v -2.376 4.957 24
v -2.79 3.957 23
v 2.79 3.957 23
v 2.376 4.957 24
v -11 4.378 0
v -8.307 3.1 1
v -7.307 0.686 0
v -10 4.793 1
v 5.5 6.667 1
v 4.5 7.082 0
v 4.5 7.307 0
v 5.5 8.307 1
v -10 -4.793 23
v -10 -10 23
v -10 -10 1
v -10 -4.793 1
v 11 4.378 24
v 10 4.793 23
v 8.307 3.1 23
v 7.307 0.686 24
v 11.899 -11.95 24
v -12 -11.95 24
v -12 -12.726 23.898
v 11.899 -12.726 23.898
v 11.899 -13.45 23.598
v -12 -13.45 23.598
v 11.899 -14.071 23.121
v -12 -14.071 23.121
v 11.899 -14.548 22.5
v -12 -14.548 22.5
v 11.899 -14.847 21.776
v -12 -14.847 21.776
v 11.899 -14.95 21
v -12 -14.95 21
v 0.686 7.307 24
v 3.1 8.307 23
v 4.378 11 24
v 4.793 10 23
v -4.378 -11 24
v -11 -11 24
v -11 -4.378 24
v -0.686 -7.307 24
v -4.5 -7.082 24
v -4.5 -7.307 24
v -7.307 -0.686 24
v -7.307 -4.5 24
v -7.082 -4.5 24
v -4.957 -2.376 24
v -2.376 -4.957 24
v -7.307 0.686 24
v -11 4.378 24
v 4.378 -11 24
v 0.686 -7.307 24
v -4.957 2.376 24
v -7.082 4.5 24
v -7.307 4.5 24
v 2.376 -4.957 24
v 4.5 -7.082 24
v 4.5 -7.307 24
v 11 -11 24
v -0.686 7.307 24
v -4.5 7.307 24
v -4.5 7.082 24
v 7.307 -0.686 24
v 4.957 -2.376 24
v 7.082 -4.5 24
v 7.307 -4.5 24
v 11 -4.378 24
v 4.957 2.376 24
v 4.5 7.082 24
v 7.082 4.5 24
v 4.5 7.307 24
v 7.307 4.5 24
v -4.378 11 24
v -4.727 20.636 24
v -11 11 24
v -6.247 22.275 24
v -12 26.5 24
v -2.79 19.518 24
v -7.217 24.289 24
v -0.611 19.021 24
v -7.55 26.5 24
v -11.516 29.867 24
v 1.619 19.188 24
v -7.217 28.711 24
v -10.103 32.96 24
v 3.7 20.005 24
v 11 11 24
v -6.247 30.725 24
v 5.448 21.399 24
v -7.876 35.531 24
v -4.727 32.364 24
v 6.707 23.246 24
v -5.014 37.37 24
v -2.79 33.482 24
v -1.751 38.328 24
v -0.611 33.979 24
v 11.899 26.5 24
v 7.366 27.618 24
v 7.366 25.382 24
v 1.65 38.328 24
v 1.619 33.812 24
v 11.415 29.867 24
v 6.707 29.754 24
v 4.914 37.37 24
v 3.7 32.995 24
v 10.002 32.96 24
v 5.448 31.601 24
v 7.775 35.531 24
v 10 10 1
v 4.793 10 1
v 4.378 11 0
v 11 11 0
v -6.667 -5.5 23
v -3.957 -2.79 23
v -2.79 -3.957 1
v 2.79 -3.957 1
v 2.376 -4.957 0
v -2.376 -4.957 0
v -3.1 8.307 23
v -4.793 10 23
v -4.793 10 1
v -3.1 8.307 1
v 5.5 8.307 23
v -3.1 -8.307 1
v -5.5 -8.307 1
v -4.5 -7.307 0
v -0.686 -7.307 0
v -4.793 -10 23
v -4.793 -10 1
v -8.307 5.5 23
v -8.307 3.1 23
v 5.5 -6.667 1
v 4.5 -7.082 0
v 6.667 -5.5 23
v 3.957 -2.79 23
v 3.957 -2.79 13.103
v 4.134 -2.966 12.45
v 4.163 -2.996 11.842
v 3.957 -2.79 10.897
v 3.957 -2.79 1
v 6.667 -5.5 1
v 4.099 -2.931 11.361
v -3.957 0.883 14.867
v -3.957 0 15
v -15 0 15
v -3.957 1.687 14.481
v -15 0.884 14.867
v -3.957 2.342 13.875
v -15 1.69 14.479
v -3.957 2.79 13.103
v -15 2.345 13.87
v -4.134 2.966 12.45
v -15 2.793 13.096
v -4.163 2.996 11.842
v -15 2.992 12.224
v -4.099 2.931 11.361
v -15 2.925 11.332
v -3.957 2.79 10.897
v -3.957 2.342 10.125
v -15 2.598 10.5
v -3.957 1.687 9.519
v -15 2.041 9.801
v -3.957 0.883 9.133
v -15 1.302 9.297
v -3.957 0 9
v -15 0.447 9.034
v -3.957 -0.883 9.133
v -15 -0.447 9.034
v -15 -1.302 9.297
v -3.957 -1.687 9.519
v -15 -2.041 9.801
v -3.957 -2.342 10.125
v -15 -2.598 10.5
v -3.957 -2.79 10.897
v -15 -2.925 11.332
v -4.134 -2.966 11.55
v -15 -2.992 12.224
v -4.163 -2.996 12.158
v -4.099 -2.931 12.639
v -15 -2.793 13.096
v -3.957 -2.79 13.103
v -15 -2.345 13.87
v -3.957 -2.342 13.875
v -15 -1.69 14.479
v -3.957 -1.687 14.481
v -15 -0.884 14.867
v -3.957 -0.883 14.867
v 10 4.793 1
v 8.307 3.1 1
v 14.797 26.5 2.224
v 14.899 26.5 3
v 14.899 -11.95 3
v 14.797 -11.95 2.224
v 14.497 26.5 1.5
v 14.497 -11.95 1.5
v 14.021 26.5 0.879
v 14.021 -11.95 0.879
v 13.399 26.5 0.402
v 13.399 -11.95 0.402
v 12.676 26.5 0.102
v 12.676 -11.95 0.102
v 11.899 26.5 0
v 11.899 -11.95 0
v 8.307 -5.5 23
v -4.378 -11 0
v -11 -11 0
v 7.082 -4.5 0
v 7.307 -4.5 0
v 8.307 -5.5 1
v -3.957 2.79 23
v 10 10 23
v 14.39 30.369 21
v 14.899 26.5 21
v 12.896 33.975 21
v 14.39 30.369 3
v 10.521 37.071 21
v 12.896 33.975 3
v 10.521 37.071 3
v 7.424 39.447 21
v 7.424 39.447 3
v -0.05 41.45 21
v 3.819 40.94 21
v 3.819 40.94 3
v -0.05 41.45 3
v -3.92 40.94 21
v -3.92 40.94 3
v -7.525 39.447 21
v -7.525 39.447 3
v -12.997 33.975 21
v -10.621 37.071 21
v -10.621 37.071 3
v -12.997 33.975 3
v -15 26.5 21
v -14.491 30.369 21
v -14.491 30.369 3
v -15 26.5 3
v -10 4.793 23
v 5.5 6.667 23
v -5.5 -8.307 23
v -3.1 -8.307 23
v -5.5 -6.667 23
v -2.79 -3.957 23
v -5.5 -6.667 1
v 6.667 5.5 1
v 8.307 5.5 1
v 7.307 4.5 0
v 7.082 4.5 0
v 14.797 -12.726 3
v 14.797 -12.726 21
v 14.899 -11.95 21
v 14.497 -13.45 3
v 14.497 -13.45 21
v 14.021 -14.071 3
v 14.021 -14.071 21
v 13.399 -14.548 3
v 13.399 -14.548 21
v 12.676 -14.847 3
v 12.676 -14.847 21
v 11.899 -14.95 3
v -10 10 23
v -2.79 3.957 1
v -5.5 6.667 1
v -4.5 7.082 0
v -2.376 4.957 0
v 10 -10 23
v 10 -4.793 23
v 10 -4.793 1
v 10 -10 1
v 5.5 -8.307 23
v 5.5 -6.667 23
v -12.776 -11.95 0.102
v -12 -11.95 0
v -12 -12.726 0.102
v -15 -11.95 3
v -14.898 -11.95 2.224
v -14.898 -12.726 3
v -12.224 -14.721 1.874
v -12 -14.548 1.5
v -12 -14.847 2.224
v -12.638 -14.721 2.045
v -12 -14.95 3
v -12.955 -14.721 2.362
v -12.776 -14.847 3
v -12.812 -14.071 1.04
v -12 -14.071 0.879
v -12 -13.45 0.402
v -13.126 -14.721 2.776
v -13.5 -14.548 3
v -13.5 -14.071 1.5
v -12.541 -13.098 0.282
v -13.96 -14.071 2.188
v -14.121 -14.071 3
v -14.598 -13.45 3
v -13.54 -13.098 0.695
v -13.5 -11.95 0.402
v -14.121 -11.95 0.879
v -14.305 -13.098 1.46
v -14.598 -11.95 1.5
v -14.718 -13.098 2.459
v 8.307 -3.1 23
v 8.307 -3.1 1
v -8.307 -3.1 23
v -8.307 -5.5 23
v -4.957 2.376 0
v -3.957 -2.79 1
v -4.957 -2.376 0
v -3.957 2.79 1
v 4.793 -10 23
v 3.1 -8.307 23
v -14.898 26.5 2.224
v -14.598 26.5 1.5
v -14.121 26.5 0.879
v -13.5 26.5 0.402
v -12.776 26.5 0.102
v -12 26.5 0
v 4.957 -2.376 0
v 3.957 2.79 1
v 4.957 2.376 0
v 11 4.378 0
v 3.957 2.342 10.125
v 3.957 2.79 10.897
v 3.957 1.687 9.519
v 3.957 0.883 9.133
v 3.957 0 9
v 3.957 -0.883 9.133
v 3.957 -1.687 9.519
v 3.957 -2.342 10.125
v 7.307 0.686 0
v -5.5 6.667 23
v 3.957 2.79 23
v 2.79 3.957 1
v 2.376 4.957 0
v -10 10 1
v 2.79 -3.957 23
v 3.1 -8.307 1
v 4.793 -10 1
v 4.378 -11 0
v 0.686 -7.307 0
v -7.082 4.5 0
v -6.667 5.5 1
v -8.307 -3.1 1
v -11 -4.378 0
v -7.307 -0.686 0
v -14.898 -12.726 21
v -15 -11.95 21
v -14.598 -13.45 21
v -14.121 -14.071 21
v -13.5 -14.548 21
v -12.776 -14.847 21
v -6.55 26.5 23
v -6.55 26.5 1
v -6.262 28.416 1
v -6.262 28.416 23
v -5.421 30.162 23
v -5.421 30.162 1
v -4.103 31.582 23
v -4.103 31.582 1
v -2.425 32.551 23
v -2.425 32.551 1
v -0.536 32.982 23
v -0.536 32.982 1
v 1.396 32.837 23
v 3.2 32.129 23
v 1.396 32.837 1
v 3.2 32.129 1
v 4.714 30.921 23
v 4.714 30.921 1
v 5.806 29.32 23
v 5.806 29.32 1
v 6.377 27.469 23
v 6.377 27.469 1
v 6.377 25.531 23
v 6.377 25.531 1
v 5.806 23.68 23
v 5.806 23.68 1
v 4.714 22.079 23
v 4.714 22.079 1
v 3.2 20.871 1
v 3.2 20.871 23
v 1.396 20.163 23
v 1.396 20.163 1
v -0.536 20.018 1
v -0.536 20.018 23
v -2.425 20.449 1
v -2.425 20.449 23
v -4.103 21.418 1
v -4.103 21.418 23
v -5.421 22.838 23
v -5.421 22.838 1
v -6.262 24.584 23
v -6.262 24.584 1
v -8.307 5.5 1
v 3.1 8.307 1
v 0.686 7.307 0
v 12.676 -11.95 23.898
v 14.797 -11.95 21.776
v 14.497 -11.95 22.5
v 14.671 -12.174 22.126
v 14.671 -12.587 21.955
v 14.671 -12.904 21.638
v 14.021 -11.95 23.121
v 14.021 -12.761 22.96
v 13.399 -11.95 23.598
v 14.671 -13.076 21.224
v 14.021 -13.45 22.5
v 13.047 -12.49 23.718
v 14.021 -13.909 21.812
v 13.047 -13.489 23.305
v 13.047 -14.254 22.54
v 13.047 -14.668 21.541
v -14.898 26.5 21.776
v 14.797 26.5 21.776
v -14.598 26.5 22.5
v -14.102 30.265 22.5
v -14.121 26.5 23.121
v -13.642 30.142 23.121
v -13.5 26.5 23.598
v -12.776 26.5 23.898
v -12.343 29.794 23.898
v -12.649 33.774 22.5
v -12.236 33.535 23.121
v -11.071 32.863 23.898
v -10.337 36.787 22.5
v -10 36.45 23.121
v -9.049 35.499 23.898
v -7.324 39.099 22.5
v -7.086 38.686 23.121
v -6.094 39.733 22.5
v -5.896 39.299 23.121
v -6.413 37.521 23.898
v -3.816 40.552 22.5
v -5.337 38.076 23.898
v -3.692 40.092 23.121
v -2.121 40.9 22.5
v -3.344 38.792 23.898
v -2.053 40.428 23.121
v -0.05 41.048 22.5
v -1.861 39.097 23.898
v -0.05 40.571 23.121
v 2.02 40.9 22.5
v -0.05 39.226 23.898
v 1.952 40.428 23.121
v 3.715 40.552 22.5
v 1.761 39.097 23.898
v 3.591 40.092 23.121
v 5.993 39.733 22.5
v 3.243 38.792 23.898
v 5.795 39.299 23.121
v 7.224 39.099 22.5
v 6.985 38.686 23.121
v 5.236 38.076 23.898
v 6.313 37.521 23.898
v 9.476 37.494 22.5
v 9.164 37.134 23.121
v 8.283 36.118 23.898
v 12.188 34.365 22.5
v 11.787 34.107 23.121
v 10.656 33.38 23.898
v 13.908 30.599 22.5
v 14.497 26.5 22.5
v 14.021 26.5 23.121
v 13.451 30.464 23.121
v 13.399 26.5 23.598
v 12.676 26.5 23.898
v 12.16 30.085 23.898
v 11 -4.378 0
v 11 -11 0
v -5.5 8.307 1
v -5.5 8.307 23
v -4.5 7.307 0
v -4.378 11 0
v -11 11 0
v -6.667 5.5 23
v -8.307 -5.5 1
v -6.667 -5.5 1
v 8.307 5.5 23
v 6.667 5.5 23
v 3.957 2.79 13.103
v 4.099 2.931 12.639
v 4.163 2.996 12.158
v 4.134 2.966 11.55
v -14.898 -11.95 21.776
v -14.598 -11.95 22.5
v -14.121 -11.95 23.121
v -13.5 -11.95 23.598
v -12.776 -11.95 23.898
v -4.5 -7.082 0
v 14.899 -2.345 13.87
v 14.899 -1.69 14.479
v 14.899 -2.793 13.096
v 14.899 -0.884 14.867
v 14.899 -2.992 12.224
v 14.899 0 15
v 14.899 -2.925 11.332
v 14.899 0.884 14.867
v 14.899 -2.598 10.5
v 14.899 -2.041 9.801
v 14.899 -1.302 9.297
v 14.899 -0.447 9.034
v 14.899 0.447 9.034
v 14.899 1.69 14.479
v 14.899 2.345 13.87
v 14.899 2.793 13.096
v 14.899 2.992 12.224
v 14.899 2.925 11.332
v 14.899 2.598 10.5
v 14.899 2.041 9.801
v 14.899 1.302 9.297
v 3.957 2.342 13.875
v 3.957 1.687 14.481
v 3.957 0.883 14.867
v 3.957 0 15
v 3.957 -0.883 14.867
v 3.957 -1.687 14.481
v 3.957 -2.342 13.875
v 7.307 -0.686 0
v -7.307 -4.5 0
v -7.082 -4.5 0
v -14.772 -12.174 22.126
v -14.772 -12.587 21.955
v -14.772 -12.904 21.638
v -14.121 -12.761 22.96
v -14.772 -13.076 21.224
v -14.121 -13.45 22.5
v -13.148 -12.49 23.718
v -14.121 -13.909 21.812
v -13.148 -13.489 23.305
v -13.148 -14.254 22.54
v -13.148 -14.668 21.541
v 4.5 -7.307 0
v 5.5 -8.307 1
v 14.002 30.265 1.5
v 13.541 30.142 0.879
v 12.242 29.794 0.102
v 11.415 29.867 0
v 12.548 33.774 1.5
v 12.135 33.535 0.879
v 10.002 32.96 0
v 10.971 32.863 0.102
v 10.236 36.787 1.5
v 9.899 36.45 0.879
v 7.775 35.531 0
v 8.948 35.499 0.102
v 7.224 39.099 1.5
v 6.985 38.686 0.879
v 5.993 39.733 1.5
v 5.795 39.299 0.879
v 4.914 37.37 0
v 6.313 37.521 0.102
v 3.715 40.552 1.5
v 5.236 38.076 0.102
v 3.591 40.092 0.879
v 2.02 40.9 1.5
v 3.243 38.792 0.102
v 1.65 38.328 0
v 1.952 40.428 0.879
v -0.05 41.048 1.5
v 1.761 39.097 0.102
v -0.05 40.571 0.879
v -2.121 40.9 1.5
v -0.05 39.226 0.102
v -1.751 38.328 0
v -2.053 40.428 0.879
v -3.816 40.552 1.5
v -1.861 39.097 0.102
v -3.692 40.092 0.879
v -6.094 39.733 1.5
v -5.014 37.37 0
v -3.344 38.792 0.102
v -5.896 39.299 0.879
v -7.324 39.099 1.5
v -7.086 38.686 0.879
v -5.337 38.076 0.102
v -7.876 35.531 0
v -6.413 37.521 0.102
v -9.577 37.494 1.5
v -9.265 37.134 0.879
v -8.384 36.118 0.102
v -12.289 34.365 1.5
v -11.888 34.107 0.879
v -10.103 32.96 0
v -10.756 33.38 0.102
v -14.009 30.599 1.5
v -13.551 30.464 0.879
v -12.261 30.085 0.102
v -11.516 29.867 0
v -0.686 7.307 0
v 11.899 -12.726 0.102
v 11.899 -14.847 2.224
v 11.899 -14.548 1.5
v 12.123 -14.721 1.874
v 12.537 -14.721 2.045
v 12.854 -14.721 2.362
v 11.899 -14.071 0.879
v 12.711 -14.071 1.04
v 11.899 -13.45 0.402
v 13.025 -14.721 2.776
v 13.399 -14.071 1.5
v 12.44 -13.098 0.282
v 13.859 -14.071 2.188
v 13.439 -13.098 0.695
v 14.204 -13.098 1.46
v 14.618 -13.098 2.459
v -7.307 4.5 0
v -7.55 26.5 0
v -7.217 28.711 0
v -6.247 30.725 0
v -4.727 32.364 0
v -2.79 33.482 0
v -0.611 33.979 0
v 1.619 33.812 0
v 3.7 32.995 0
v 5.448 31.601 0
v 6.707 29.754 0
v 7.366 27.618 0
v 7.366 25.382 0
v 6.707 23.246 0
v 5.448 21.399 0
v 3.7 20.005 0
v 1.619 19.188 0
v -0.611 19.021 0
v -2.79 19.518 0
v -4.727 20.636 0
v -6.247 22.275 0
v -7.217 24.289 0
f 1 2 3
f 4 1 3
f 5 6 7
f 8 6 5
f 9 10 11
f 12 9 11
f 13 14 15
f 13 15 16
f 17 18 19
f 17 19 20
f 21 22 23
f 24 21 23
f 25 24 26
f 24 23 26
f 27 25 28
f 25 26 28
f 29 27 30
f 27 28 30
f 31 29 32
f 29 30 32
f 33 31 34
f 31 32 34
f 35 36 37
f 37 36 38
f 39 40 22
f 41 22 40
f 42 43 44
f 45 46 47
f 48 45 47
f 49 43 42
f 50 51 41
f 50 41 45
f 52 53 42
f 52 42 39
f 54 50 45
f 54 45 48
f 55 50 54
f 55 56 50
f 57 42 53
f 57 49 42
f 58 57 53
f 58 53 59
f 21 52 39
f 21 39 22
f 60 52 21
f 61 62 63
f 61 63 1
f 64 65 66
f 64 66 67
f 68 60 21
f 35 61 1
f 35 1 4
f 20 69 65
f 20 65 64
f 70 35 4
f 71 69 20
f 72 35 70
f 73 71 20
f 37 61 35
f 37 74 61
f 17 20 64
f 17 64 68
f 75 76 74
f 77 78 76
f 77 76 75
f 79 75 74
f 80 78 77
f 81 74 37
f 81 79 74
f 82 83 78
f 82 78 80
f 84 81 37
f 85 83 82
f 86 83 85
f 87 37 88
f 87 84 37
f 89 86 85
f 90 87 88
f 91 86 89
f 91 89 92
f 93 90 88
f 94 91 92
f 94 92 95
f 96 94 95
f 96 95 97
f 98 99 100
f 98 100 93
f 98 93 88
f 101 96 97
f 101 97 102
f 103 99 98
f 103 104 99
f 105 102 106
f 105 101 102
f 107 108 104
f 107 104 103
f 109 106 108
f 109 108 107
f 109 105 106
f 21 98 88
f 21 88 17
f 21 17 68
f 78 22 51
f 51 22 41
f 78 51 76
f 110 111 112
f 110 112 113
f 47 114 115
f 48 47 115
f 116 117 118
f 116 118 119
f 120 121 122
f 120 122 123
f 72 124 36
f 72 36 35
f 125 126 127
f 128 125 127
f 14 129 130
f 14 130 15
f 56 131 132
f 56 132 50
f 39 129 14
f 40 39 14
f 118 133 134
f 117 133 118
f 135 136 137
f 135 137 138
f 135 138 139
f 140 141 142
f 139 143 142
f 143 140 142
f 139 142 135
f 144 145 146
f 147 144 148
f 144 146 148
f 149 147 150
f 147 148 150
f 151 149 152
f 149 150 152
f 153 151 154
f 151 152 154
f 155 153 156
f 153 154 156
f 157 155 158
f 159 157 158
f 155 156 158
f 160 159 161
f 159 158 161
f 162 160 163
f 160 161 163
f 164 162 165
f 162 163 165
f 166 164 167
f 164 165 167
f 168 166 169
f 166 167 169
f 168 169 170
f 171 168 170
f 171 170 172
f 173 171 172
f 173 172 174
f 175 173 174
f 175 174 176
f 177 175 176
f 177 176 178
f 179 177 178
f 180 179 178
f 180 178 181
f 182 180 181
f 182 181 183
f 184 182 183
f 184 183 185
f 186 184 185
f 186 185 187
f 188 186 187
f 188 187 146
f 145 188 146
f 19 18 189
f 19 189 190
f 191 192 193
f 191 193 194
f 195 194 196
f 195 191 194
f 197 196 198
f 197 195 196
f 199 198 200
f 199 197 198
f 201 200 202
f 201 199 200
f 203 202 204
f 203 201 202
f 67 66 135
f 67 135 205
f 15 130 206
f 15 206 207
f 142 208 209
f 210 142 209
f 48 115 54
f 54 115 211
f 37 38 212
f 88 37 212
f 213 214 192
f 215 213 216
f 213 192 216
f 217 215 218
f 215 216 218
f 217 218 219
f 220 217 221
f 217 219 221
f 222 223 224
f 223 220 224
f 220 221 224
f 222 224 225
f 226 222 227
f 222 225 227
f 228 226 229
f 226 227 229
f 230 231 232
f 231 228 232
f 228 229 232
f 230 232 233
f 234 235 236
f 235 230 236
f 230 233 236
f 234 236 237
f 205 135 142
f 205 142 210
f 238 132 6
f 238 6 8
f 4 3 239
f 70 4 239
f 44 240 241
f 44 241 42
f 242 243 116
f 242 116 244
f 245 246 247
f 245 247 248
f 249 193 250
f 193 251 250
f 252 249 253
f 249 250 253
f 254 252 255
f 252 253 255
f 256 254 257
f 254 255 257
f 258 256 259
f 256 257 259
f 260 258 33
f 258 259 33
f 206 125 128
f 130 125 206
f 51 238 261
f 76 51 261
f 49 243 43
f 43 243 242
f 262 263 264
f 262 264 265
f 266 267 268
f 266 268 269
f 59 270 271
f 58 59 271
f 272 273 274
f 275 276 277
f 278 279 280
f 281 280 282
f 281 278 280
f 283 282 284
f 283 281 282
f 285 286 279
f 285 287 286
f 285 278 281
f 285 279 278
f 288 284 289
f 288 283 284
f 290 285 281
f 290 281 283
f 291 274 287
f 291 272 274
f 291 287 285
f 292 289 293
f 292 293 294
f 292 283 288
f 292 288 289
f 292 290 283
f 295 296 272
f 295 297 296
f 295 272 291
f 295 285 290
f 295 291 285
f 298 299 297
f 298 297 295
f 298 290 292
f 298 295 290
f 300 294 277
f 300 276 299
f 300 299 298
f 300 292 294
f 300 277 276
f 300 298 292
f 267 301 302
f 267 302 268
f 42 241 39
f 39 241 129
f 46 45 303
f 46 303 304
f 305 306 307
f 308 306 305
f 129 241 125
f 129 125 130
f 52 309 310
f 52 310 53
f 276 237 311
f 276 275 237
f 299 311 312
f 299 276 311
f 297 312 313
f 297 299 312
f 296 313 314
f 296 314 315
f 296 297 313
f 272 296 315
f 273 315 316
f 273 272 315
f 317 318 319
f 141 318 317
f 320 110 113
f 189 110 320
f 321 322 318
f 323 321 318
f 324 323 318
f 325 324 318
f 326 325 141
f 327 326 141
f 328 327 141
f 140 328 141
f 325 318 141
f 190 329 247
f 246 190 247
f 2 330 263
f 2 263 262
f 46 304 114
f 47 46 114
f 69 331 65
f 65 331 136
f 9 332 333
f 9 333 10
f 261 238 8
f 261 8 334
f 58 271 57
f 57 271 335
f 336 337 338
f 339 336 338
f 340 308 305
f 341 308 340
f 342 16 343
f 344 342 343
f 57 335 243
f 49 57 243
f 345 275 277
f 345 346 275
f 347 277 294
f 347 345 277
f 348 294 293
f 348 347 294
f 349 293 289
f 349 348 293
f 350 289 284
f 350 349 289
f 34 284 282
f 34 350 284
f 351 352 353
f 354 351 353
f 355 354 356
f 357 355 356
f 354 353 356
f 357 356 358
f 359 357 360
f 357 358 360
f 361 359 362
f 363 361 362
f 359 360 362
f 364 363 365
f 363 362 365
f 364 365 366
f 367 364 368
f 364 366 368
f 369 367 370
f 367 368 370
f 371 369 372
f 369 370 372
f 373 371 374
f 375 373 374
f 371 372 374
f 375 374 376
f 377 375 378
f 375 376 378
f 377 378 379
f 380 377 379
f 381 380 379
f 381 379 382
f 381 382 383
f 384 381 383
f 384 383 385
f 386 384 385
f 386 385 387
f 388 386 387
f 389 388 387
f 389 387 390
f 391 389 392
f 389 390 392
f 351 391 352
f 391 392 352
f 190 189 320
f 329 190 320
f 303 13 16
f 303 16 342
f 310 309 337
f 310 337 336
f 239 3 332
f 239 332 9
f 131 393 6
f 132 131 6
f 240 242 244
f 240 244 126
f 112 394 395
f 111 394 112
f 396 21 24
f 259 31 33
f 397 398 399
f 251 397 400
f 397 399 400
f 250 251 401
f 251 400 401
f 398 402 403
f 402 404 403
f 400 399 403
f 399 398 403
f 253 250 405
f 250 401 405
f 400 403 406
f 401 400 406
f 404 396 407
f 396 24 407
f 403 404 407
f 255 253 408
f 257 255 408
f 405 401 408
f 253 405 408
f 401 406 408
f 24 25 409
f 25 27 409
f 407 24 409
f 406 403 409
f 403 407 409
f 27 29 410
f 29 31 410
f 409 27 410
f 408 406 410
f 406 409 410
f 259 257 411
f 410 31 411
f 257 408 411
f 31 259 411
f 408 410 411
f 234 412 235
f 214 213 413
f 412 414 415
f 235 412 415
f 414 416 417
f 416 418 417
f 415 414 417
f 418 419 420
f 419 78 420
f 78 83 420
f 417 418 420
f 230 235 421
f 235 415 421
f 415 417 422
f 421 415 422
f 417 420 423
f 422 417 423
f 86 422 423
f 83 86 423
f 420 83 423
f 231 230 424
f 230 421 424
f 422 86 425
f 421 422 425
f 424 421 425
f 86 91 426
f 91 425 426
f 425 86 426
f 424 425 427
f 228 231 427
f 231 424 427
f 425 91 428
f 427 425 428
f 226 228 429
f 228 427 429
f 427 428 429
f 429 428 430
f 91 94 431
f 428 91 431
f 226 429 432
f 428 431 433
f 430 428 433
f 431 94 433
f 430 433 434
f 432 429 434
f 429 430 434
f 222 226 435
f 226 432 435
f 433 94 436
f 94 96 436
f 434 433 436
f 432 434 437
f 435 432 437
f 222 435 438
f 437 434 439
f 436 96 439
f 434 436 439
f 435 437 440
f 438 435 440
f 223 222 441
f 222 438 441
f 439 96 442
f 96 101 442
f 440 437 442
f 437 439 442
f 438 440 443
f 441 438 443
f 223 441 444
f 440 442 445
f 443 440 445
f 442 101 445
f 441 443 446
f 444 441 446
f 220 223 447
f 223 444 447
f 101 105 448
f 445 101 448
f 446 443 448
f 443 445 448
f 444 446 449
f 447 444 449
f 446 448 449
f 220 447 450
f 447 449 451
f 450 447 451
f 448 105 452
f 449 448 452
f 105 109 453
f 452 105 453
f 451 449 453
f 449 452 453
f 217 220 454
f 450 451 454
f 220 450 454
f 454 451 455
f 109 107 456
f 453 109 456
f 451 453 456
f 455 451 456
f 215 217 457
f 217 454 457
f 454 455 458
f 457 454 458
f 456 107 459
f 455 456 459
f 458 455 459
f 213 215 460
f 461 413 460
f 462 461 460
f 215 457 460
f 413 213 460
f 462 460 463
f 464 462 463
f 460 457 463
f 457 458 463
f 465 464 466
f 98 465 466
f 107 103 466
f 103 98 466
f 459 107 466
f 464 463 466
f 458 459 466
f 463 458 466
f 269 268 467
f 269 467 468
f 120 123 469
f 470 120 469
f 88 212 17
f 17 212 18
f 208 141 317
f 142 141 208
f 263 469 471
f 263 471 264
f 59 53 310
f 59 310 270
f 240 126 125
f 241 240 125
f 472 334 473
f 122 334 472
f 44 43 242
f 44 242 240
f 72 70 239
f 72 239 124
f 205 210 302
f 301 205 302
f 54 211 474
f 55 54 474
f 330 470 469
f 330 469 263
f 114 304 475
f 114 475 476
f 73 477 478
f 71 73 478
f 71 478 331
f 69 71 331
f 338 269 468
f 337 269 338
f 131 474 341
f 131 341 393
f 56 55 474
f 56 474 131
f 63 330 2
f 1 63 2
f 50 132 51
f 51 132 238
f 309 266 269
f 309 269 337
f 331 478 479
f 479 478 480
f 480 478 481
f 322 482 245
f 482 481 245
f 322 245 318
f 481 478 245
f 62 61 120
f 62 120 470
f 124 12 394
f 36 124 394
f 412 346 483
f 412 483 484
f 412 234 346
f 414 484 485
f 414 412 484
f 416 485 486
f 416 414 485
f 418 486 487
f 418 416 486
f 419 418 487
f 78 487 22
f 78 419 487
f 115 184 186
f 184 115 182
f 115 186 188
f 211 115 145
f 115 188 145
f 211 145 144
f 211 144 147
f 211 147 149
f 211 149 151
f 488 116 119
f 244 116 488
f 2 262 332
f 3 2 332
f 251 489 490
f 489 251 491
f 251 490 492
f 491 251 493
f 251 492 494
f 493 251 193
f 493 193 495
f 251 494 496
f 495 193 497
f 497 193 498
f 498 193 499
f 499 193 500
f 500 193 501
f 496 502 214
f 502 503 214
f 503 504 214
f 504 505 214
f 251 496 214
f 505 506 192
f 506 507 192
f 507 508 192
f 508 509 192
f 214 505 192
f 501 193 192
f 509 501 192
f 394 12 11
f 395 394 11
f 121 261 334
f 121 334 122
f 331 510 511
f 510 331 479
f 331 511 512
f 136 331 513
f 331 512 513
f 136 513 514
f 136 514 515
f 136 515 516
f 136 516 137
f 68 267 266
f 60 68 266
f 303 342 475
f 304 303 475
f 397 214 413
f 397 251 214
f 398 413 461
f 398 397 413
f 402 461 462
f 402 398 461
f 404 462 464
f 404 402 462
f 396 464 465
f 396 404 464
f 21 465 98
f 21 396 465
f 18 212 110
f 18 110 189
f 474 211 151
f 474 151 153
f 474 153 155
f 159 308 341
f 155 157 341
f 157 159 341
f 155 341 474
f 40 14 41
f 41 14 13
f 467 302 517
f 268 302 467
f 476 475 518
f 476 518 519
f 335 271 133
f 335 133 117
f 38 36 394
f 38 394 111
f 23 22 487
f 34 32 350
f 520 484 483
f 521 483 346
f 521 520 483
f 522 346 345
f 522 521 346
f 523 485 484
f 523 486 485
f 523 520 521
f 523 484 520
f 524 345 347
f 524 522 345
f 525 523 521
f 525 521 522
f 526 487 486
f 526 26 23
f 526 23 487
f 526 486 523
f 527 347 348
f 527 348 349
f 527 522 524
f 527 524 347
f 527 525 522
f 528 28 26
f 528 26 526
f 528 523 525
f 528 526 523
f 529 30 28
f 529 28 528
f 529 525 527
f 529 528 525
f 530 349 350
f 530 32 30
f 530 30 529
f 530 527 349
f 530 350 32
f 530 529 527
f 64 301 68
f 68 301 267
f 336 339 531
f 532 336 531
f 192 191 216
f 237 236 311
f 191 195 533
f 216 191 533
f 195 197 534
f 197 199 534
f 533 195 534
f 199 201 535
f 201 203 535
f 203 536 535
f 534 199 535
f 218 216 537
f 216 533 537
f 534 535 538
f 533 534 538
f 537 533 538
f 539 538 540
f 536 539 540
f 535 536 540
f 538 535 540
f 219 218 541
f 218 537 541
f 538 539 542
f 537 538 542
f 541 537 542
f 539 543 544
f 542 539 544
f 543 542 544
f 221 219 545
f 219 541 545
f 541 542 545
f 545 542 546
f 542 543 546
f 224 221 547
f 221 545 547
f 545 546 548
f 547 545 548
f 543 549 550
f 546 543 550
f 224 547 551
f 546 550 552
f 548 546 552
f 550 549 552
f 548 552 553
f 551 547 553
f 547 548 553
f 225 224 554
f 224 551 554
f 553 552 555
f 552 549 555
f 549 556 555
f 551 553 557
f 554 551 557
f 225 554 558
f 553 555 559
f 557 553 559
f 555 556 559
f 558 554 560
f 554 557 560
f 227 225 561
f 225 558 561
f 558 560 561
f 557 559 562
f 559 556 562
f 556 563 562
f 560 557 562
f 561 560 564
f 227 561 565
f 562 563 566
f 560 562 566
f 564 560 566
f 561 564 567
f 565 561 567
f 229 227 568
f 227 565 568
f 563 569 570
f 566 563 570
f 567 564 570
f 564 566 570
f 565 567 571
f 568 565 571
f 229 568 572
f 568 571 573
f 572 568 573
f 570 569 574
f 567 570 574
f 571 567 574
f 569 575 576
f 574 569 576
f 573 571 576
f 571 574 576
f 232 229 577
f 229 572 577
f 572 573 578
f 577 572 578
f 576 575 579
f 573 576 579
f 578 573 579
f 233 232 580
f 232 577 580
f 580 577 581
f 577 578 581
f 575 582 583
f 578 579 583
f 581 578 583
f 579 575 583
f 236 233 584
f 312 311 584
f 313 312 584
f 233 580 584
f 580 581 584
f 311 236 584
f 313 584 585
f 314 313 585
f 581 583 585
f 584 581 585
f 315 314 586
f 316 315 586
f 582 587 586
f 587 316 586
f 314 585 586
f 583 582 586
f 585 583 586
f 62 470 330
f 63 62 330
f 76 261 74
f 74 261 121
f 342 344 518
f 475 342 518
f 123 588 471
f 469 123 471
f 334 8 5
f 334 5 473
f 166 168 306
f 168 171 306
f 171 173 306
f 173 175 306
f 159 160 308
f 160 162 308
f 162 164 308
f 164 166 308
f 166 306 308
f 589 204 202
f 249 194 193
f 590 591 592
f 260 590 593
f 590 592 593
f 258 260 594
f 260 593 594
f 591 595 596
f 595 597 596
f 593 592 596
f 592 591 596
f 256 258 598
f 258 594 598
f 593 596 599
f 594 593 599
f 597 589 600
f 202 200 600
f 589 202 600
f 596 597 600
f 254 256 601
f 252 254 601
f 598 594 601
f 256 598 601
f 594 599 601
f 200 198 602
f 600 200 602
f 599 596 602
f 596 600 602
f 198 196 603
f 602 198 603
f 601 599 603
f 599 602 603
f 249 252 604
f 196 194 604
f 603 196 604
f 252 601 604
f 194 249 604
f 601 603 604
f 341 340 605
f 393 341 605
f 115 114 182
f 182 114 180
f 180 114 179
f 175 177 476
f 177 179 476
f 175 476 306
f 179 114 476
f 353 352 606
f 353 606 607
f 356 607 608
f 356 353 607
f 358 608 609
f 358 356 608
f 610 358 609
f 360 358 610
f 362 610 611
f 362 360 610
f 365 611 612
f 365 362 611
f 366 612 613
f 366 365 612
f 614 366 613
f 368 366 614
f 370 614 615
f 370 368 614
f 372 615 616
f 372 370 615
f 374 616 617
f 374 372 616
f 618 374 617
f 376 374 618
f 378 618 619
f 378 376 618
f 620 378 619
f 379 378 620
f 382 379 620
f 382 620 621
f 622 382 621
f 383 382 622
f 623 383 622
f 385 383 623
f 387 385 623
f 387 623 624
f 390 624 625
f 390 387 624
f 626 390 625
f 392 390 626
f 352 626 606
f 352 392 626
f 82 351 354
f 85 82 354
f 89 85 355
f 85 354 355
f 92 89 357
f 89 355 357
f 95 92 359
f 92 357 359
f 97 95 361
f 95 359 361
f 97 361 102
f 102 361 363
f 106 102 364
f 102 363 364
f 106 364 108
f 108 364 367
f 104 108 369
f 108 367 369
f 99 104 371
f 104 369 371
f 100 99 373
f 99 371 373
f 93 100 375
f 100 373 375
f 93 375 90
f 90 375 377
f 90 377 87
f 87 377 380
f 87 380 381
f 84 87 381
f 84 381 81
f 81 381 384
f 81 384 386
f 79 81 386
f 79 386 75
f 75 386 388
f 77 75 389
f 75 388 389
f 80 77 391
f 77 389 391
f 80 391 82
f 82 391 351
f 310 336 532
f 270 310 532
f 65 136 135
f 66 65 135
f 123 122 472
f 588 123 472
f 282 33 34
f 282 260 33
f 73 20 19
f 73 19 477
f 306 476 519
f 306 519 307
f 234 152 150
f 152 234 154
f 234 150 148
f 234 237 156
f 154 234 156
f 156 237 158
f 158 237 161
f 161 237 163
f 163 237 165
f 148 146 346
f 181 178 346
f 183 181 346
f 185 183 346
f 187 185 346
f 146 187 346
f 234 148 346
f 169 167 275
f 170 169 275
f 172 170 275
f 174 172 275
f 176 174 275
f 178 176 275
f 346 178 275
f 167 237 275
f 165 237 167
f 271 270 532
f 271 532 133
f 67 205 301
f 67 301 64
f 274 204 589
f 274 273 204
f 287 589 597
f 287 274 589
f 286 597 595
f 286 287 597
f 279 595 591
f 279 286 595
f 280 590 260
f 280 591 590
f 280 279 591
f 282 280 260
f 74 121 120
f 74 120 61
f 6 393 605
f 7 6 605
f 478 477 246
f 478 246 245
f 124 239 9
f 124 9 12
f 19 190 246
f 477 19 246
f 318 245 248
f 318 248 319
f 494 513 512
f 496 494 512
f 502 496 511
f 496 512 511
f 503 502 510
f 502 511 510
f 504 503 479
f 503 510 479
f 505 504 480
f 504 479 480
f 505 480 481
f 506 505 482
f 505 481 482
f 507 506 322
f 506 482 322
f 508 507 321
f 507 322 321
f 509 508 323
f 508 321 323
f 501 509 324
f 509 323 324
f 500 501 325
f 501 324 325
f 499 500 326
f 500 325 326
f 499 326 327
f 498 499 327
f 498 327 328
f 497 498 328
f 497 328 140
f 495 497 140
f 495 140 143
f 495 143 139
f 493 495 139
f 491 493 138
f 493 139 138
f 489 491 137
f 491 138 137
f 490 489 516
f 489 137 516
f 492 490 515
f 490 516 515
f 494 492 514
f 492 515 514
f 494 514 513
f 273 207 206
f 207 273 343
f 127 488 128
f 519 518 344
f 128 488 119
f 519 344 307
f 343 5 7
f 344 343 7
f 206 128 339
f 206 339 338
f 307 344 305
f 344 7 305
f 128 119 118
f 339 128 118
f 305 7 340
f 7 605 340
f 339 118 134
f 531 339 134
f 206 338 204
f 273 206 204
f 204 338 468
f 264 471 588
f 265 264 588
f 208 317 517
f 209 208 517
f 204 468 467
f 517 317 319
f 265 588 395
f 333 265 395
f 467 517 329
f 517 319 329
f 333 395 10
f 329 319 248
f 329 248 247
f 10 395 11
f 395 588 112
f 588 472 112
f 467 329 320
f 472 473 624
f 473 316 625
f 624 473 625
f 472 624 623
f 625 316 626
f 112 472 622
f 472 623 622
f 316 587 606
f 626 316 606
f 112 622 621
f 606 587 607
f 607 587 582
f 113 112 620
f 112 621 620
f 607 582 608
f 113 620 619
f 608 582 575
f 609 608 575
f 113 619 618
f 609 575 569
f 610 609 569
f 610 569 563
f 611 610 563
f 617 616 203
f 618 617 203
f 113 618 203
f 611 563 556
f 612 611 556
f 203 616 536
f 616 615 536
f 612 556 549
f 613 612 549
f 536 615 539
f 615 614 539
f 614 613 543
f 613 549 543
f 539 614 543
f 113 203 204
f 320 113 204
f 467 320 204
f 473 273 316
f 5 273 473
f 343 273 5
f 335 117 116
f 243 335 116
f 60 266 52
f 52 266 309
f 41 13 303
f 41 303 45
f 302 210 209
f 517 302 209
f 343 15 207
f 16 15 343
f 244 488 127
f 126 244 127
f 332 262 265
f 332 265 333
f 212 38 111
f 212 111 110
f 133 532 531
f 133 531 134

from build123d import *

# Parameters (mm, degrees)
BOSS_EXTRUDE1_DEPTH = 24
SKETCH4_R           = 6.5
BOSS_EXTRUDE2_DEPTH = 24
SKETCH3_R           = 3
CUT_EXTRUDE1_DEPTH  = 30.899298428
FILLET1_R           = 3
CHAMFER1_SIZE       = 1


with BuildPart() as part:
    # Sketch1 → Boss-Extrude1 (new body)
    with BuildSketch(Plane.XY):
        Polygon((0, 15), (14.899298428, 15), (14.899298428, -14.949649214), (-15, -14.949649214), (-15, 15), align=None)
        Polygon((-10, 10), (-4.792538857, 10), (-3.1, 8.307461143), (-5.5, 8.307461143), (-5.5, 6.667461143), (-2.79, 3.957461143), (2.79, 3.957461143), (5.5, 6.667461143), (5.5, 8.307461143), (3.1, 8.307461143), (4.792538857, 10), (10, 10), (10, 4.792538857), (8.307461143, 3.1), (8.307461143, 5.5), (6.667461143, 5.5), (3.957461143, 2.79), (3.957461143, -2.79), (6.667461143, -5.5), (8.307461143, -5.5), (8.307461143, -3.1), (10, -4.792538857), (10, -10), (4.792538857, -10), (3.1, -8.307461143), (5.5, -8.307461143), (5.5, -6.667461143), (2.79, -3.957461143), (-2.79, -3.957461143), (-5.5, -6.667461143), (-5.5, -8.307461143), (-3.1, -8.307461143), (-4.792538857, -10), (-10, -10), (-10, -4.792538857), (-8.307461143, -3.1), (-8.307461143, -5.5), (-6.667461143, -5.5), (-3.957461143, -2.79), (-3.957461143, 2.79), (-6.667461143, 5.5), (-8.307461143, 5.5), (-8.307461143, 3.1), (-10, 4.792538857), align=None, mode=Mode.SUBTRACT)
    extrude(amount=BOSS_EXTRUDE1_DEPTH)

    # Sketch4 → Boss-Extrude2 (add)
    with BuildSketch(Plane(origin=(0, 0, 0), x_dir=(-1, 0, 0), z_dir=(0, 0, -1))):
        with BuildLine():
            ThreePointArc((-14.899298428, 26.5), (0.050350786, 41.449649214), (15, 26.5))
            Line((15, 26.5), (15, 15))
            Line((15, 15), (-14.899298428, 15))
            Line((-14.899298428, 15), (-14.899298428, 26.5))
        make_face()
        with Locations((0.050350786, 26.5)):
            Circle(SKETCH4_R, mode=Mode.SUBTRACT)
    extrude(amount=-BOSS_EXTRUDE2_DEPTH)

    # Sketch3 → Cut-Extrude1 (cut, through all)
    with BuildSketch(Plane.ZY.offset(15)):
        with Locations((12, 0)):
            Circle(SKETCH3_R)
    extrude(amount=-CUT_EXTRUDE1_DEPTH, mode=Mode.SUBTRACT)

    # Fillet1
    fillet1_edges = [part.edges().sort_by_distance(p)[0] for p in [
        (-0.050350786, -14.949649214, 24),
        (14.899298428, 5.775175393, 24),
        (-0.050350786, 41.449649214, 24),
        (-0.050350786, 41.449649214, 0),
        (14.899298428, 5.775175393, 0),
        (-0.050350786, -14.949649214, 0),
        (-15, 5.775175393, 0),
        (-15, 5.775175393, 24),
        (14.899298428, -14.949649214, 12),
        (-15, -14.949649214, 12),
    ]]
    fillet(fillet1_edges, radius=FILLET1_R)

    # Chamfer1
    chamfer1_edges = [part.edges().sort_by_distance(p)[0] for p in [
        (6.449649214, 26.5, 24),
        (6.449649214, 26.5, 0),
        (-4.3, 8.307461143, 0),
        (-3.946269429, 9.153730571, 0),
        (-7.396269429, 10, 0),
        (-10, 7.396269429, 0),
        (-9.153730571, 3.946269429, 0),
        (-8.307461143, 4.3, 0),
        (-7.487461143, 5.5, 0),
        (-5.312461143, 4.145, 0),
        (-3.957461143, 0, 0),
        (-5.312461143, -4.145, 0),
        (-7.487461143, -5.5, 0),
        (-8.307461143, -4.3, 0),
        (-9.153730571, -3.946269429, 0),
        (-10, -7.396269429, 0),
        (-7.396269429, -10, 0),
        (-3.946269429, -9.153730571, 0),
        (-4.3, -8.307461143, 0),
        (-5.5, -7.487461143, 0),
        (-4.145, -5.312461143, 0),
        (0, -3.957461143, 0),
        (4.145, -5.312461143, 0),
        (5.5, -7.487461143, 0),
        (4.3, -8.307461143, 0),
        (3.946269429, -9.153730571, 0),
        (7.396269429, -10, 0),
        (10, -7.396269429, 0),
        (9.153730571, -3.946269429, 0),
        (8.307461143, -4.3, 0),
        (7.487461143, -5.5, 0),
        (5.312461143, -4.145, 0),
        (3.957461143, 0, 0),
        (5.312461143, 4.145, 0),
        (7.487461143, 5.5, 0),
        (8.307461143, 4.3, 0),
        (9.153730571, 3.946269429, 0),
        (10, 7.396269429, 0),
        (7.396269429, 10, 0),
        (3.946269429, 9.153730571, 0),
        (4.3, 8.307461143, 0),
        (5.5, 7.487461143, 0),
        (4.145, 5.312461143, 0),
        (0, 3.957461143, 0),
        (-4.145, 5.312461143, 0),
        (-5.5, 7.487461143, 0),
        (-4.3, 8.307461143, 24),
        (-3.946269429, 9.153730571, 24),
        (-7.396269429, 10, 24),
        (-10, 7.396269429, 24),
        (-9.153730571, 3.946269429, 24),
        (-8.307461143, 4.3, 24),
        (-7.487461143, 5.5, 24),
        (-5.312461143, 4.145, 24),
        (-3.957461143, 0, 24),
        (-5.312461143, -4.145, 24),
        (-7.487461143, -5.5, 24),
        (-8.307461143, -4.3, 24),
        (-9.153730571, -3.946269429, 24),
        (-10, -7.396269429, 24),
        (-7.396269429, -10, 24),
        (-3.946269429, -9.153730571, 24),
        (-4.3, -8.307461143, 24),
        (-5.5, -7.487461143, 24),
        (-4.145, -5.312461143, 24),
        (0, -3.957461143, 24),
        (4.145, -5.312461143, 24),
        (5.5, -7.487461143, 24),
        (4.3, -8.307461143, 24),
        (3.946269429, -9.153730571, 24),
        (7.396269429, -10, 24),
        (10, -7.396269429, 24),
        (9.153730571, -3.946269429, 24),
        (8.307461143, -4.3, 24),
        (7.487461143, -5.5, 24),
        (5.312461143, -4.145, 24),
        (3.957461143, 0, 24),
        (5.312461143, 4.145, 24),
        (7.487461143, 5.5, 24),
        (8.307461143, 4.3, 24),
        (9.153730571, 3.946269429, 24),
        (10, 7.396269429, 24),
        (7.396269429, 10, 24),
        (3.946269429, 9.153730571, 24),
        (4.3, 8.307461143, 24),
        (5.5, 7.487461143, 24),
        (4.145, 5.312461143, 24),
        (0, 3.957461143, 24),
        (-4.145, 5.312461143, 24),
        (-5.5, 7.487461143, 24),
    ]]
    chamfer(chamfer1_edges, length=CHAMFER1_SIZE)


solid = part.part
